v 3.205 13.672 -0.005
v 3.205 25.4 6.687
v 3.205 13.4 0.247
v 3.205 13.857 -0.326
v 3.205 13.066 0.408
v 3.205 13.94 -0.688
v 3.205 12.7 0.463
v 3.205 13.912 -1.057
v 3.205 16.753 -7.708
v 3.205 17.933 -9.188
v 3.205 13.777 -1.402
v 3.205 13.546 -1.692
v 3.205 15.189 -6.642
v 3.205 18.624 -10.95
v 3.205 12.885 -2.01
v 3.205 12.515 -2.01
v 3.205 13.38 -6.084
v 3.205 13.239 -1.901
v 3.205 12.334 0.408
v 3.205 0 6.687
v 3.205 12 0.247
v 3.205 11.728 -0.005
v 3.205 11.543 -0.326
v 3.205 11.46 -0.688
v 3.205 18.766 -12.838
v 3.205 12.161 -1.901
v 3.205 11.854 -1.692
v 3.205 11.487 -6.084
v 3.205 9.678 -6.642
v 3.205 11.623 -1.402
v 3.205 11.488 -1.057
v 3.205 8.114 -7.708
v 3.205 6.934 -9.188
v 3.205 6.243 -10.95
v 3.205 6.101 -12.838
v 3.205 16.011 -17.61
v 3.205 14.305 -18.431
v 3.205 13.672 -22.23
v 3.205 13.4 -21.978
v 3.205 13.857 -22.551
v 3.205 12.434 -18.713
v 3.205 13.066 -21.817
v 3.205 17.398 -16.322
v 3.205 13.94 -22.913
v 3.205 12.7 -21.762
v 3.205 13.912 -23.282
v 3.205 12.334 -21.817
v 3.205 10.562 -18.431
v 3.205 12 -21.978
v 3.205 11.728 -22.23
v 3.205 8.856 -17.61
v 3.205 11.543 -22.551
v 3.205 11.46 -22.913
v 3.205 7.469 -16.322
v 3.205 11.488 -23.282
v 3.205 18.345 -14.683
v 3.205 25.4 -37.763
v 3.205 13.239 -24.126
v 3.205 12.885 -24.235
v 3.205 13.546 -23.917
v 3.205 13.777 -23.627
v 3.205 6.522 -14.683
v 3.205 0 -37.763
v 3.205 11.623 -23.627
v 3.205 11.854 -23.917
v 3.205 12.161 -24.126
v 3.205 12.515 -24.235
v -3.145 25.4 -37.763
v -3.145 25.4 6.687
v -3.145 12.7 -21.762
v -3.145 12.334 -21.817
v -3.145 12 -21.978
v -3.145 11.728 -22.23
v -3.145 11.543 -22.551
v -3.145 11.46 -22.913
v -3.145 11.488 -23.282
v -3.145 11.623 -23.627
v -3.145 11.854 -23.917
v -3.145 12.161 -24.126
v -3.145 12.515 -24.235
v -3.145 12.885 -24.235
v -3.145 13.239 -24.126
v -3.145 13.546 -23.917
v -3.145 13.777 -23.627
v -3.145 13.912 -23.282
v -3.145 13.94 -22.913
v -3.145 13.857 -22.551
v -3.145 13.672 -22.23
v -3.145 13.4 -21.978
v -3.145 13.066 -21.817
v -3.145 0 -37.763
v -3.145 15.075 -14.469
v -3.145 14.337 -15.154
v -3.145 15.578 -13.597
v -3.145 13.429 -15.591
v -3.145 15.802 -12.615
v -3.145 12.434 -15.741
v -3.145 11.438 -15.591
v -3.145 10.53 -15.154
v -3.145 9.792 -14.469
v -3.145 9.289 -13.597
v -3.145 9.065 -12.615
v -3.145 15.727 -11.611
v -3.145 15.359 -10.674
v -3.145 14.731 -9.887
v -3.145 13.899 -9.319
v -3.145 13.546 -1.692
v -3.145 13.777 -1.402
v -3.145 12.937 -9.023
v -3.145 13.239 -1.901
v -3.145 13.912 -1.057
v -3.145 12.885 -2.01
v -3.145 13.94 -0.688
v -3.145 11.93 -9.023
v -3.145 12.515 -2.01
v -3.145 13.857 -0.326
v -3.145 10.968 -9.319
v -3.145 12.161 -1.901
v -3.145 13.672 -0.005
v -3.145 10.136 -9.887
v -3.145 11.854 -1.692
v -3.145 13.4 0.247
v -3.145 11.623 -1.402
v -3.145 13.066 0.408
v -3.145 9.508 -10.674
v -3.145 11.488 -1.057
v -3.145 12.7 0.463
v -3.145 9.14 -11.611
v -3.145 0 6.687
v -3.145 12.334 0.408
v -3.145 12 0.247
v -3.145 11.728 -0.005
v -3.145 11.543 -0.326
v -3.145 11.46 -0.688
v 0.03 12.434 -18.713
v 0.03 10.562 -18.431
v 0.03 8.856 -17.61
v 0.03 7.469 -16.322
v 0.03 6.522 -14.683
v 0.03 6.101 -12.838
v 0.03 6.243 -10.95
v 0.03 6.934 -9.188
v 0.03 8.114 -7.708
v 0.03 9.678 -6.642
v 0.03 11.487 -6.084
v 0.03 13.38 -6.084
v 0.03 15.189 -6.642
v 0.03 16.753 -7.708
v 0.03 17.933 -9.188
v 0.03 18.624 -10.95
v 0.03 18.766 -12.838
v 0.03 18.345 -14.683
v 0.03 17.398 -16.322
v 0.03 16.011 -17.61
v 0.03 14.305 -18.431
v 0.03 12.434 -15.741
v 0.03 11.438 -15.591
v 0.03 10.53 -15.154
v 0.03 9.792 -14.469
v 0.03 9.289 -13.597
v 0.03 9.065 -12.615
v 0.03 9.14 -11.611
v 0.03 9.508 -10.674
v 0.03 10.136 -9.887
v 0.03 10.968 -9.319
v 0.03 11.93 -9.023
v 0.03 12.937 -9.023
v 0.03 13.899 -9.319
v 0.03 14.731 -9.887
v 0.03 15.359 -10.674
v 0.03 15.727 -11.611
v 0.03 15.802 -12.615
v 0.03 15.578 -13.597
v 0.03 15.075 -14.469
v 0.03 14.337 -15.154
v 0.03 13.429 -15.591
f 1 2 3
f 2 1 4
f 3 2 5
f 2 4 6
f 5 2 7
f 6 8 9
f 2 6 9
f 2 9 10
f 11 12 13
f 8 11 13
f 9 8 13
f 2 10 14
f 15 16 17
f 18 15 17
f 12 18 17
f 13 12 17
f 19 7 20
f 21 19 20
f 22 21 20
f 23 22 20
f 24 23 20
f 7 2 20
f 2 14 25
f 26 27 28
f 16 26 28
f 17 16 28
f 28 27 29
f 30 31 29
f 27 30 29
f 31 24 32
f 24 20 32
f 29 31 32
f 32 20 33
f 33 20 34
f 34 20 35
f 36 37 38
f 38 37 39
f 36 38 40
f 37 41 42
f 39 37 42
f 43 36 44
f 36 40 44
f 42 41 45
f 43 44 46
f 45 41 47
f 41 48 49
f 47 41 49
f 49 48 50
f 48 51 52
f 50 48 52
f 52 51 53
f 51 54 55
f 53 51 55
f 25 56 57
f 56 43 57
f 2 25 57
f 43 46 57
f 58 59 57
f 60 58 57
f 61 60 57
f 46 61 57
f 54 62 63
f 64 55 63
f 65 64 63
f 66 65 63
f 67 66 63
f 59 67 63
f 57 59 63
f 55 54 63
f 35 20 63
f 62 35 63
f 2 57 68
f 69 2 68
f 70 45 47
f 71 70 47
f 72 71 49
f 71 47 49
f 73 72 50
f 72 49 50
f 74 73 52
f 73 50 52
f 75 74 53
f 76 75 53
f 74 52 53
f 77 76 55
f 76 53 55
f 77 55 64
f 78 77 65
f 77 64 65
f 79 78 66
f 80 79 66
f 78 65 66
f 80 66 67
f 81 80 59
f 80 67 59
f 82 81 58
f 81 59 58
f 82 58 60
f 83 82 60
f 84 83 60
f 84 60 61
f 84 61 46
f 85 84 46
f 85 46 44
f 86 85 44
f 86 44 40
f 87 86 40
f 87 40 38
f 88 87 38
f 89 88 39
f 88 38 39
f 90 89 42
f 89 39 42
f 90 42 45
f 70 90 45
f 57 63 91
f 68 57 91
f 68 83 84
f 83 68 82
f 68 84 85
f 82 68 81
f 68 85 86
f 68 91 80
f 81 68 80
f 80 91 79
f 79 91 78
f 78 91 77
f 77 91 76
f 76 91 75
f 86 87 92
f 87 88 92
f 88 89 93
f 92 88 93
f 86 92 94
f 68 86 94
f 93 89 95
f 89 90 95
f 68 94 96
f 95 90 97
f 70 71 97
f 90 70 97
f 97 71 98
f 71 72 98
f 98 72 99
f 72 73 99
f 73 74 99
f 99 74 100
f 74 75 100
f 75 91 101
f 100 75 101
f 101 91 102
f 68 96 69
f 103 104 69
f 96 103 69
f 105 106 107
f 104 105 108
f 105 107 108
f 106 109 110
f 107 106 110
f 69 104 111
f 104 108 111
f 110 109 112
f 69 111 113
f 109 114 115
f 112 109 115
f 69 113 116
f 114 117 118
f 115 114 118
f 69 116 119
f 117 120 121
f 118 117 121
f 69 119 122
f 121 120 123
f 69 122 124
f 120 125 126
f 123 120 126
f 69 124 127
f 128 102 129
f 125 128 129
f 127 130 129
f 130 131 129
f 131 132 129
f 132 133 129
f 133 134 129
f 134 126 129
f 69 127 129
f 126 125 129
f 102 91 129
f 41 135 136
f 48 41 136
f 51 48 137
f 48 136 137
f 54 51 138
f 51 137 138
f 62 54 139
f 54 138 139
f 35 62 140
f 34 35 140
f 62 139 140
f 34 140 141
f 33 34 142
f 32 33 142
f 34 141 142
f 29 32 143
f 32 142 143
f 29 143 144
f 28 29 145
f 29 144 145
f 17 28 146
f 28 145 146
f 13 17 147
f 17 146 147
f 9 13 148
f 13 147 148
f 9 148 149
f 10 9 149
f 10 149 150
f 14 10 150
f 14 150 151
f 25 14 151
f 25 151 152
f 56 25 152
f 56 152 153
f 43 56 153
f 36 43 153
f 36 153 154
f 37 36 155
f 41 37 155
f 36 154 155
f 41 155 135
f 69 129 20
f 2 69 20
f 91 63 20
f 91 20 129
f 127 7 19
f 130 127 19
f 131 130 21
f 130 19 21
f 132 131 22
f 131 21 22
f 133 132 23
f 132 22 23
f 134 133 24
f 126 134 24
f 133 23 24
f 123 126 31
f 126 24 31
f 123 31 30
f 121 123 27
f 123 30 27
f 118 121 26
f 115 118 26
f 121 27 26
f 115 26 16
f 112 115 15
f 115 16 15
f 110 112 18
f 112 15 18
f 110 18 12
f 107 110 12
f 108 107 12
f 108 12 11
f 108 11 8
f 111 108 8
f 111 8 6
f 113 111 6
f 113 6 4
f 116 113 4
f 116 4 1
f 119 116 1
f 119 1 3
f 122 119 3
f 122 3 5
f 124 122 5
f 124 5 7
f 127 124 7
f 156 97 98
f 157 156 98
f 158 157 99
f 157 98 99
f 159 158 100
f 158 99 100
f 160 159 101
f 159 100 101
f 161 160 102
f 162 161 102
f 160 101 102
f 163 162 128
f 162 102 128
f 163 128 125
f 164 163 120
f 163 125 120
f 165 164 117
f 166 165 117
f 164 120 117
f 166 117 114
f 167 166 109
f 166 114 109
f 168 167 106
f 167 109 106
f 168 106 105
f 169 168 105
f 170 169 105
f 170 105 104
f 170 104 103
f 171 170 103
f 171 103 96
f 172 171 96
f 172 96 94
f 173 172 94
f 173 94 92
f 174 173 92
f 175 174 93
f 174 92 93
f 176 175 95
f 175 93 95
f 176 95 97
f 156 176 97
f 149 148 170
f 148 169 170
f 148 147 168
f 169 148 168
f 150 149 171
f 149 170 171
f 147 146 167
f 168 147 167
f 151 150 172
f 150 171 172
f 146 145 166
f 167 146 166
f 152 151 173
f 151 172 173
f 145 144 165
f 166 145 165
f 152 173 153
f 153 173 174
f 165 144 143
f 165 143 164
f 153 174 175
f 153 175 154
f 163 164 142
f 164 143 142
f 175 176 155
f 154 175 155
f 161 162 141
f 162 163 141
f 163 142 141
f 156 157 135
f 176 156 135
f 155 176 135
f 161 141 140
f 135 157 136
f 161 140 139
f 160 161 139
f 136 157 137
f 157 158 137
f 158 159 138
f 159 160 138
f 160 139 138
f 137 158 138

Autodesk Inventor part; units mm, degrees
ref_plane "YZ Plane" through (0, 0, 0) normal (1, 0, 0) x (0, 1, 0)
ref_plane "XZ Plane" through (0, 0, 0) normal (0, 1, 0) x (-1, 0, 0)
ref_plane "XY Plane" through (0, 0, 0) normal (0, 0, 1) x (1, 0, 0)
sketch "Sketch1" plane through (0, 0, 0) normal (0, 1, 0) x (-1, 0, 0)
  line L0 (3.1454, 6.687) -> (-3.2046, 6.687)
  line L1 (-3.2046, 6.687) -> (-3.2046, -37.763)
  line L2 (-3.2046, -37.763) -> (3.1454, -37.763)
  line L3 (3.1454, -37.763) -> (3.1454, 6.687)
  point P0 (0, 0)
  dimension "d0" = 6.35
  dimension "d1" = 44.45
extrude "Extrusion1" add sketch "Sketch1" along normal blind 25.4
sketch "Sketch2" plane through (3.2046, 0, 6.687) normal (1, 0, 0) x (0, 0, -1)
  line L0 (0, 0) -> (0, 25.4) projected
  point P0 (6.687, 0)
  point P1 (19.05, 12.4335)
  dimension "d4" = 19.05
hole "Hole1" at (3.2046, 12.4335, -12.363) direction (-1, 0, 0) diameter 6.7564 end through all counterbore diameter 12.7 counterbore depth 3.175 clearance for "Hex Head Bolt" size "1/4" standard "Ansi Unified Screw Threads"
sketch "Sketch4" plane through (-3.1454, 0, -37.763) normal (-1, 0, 0) x (0, 0, 1)
  line L0 (44.45, 0) -> (44.45, 25.4) projected
  point P0 (37.763, 0)
  point P1 (14.7574, 12.7)
  dimension "d20" = 29.6926
hole "Hole3" at (-3.1454, 12.7, -23.0056) direction (1, 0, 0) diameter 2.4867 end through all thread size "5-40 UNC" class "2B" standard "ANSI Unified Screw Threads"
sketch "Sketch5" plane through (-3.1454, 0, -37.763) normal (-1, 0, 0) x (0, 0, 1)
  line L0 (44.45, 0) -> (44.45, 25.4) projected
  line L1 (0, 25.4) -> (44.45, 25.4) projected
  point P0 (37.763, 0)
  point P1 (36.9824, 12.7)
  dimension "d28" = 7.4676
  dimension "d36" = 12.7
hole "Hole4" at (-3.1454, 12.7, -0.7806) direction (1, 0, 0) diameter 2.4867 end through all thread size "5-40 UNC" class "2B" standard "ANSI Unified Screw Threads"
equation "\"d22\" = d20"
equation "\"d30\" = d28"
properties part number "Zero Dead Space Electronic needle valve holder Newst"
